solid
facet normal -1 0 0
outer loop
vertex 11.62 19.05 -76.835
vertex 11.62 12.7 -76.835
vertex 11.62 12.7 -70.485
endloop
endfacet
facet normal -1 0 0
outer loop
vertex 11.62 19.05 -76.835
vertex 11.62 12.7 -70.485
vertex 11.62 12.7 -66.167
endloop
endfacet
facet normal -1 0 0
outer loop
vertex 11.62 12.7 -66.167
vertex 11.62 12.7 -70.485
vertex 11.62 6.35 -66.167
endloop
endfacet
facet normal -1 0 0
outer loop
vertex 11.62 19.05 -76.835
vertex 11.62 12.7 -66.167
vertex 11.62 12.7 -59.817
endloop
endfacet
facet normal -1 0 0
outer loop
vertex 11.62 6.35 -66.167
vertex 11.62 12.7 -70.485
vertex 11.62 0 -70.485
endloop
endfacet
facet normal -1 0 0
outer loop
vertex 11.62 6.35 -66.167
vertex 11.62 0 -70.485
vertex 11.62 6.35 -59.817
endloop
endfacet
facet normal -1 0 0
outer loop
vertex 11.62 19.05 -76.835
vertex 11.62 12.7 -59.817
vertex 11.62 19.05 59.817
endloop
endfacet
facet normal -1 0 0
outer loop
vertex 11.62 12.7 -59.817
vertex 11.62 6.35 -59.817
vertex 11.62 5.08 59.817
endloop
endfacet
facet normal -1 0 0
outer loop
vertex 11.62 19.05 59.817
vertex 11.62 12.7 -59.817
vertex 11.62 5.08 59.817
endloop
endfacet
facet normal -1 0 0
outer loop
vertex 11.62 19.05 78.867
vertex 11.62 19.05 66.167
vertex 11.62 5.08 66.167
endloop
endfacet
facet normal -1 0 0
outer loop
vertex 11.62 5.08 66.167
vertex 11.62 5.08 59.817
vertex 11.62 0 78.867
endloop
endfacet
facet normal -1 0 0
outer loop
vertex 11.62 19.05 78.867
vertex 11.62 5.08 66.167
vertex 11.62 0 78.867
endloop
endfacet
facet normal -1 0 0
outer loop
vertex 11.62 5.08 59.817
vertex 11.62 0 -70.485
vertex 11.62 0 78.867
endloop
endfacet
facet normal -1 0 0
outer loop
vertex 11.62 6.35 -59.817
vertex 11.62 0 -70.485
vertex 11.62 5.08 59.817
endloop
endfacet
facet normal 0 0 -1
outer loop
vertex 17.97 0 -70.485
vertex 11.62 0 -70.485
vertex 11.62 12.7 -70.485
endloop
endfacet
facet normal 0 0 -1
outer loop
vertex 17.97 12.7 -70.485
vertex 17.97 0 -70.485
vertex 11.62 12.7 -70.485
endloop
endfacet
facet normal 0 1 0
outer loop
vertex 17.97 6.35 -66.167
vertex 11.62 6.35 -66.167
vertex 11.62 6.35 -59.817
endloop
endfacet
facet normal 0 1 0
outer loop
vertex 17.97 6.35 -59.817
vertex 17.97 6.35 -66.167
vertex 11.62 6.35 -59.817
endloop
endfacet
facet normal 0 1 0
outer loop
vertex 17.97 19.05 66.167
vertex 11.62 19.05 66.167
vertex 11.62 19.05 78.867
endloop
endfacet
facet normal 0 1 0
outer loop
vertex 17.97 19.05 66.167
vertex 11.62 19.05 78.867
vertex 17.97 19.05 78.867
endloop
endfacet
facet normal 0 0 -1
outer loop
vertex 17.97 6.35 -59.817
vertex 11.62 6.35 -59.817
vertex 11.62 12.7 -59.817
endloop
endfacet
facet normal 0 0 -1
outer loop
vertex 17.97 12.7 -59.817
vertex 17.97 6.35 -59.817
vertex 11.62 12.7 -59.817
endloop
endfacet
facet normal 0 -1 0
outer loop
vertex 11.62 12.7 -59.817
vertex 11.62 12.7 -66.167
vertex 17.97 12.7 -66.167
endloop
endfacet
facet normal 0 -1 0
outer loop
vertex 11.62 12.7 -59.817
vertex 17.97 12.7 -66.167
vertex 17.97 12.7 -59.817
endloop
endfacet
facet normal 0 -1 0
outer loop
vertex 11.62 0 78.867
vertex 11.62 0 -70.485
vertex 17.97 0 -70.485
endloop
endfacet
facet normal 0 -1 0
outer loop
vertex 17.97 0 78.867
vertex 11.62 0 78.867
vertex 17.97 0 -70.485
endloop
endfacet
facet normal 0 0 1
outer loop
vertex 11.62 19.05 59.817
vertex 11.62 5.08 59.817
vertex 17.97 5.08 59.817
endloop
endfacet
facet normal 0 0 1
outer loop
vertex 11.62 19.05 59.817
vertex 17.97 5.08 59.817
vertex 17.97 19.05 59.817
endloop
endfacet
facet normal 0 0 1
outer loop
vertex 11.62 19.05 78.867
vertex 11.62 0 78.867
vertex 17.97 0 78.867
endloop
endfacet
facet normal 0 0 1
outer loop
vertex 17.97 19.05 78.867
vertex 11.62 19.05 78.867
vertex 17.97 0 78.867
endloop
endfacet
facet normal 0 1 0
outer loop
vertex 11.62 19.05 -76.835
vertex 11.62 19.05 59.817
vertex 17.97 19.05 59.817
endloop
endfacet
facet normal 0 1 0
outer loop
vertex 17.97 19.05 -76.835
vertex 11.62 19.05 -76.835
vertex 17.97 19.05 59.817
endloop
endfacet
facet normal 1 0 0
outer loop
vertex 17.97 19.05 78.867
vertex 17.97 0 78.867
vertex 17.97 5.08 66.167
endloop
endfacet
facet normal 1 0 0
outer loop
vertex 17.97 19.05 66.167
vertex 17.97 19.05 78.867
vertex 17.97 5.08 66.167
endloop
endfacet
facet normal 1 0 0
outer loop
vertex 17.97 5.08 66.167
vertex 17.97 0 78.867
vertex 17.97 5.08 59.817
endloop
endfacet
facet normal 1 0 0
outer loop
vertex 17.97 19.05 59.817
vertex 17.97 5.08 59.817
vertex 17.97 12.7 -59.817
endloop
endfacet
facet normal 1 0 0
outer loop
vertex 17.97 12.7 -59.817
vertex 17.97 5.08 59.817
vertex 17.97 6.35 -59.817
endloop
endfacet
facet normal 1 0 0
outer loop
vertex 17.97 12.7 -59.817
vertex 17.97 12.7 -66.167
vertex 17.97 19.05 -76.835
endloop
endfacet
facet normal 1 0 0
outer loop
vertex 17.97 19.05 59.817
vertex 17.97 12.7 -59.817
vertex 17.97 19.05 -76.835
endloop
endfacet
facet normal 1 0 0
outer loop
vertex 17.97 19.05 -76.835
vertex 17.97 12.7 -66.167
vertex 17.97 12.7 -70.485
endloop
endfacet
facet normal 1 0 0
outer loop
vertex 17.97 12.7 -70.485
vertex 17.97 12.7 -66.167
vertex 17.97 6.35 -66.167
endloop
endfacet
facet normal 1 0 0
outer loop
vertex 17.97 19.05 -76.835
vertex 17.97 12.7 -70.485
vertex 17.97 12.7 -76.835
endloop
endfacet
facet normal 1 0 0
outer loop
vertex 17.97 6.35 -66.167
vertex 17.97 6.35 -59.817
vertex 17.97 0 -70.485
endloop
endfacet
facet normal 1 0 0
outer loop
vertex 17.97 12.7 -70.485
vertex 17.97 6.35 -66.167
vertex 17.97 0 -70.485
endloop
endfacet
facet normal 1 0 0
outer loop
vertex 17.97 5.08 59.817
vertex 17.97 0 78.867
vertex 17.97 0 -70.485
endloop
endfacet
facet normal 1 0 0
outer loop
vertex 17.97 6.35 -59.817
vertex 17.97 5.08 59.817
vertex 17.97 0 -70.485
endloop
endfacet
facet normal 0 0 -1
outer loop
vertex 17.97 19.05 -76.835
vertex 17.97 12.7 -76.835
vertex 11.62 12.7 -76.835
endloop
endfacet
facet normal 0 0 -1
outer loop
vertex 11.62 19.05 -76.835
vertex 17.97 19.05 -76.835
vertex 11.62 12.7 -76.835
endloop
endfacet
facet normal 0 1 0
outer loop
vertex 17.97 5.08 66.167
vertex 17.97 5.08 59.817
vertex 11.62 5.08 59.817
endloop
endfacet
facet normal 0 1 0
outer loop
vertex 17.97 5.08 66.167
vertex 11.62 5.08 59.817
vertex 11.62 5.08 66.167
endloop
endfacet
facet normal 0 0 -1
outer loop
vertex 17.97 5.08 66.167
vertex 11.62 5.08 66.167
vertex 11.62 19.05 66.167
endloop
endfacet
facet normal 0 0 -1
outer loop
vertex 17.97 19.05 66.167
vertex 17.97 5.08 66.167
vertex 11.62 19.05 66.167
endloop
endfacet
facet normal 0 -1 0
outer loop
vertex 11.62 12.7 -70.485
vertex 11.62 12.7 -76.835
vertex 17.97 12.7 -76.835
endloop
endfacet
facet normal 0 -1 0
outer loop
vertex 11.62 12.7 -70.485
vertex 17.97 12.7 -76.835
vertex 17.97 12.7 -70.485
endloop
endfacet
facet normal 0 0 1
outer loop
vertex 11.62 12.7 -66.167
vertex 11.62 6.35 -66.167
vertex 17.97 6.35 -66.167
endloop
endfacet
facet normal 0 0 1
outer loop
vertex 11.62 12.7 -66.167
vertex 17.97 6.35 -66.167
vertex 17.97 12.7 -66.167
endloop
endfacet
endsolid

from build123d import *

# Parameters (mm, degrees)
BOSS_EXTRUDE1_DEPTH = 19.05
SKETCH2_W           = 43.434
SKETCH2_H           = 13.97
MOTOR_HOLE_DEPTH    = 19.05
SKETCH3_W           = 6.35
SKETCH3_H           = 12.7
CUT_EXTRUDE2_DEPTH  = 36.941
SKETCH5_W           = 6.35
SKETCH5_H           = 13.97
SKETCH5_H_2         = 6.35
CUT_EXTRUDE6_DEPTH  = 36.941
SKETCH7_W           = 45.976326486
SKETCH7_H           = 159.787423729
CUT_EXTRUDE7_DEPTH  = 20.05


with BuildPart() as part:
    # Sketch1 → Boss-Extrude1 (new body)
    with BuildSketch(Plane(origin=(0, 0, 0), x_dir=(1, 0, 0), z_dir=(0, 1, 0))):
        Polygon((-10.033, 66.167), (-11.6205, 66.167), (-11.6205, 76.835), (-17.9705, 76.835), (-17.9705, -78.867), (-11.6205, -78.867), (-11.6205, -66.167), (11.6205, -66.167), (11.6205, -78.867), (17.9705, -78.867), (17.9705, 76.835), (11.6205, 76.835), (11.6205, 66.167), (10.033, 66.167), (10.033, 59.817), (11.6205, 59.817), (11.6205, -59.817), (-11.6205, -59.817), (-11.6205, 59.817), (-10.033, 59.817), align=None)
    extrude(amount=BOSS_EXTRUDE1_DEPTH)

    # Sketch2 → Motor Hole (cut)
    with BuildSketch(Plane.ZY.offset(17.9705)):
        with Locations((29.972, 12.065)):
            Rectangle(SKETCH2_W, SKETCH2_H)
    extrude(amount=-MOTOR_HOLE_DEPTH, mode=Mode.SUBTRACT)

    # Sketch3 → Cut-Extrude2 (cut, through all)
    with BuildSketch(Plane.ZY.offset(17.9705)):
        with Locations((-73.66, 6.35)):
            Rectangle(SKETCH3_W, SKETCH3_H)
    extrude(amount=-CUT_EXTRUDE2_DEPTH, mode=Mode.SUBTRACT)

    # Sketch5 → Cut-Extrude6 (cut, through all)
    with BuildSketch(Plane.ZY.offset(17.9705)):
        with Locations((62.992, 12.065)):
            Rectangle(SKETCH5_W, SKETCH5_H)
        with Locations((-62.992, 9.525)):
            Rectangle(SKETCH5_W, SKETCH5_H_2)
    extrude(amount=-CUT_EXTRUDE6_DEPTH, mode=Mode.SUBTRACT)

    # Sketch7 → Cut-Extrude7 (cut, through all)
    with BuildSketch(Plane(origin=(0, 0, 0), x_dir=(1, 0, 0), z_dir=(0, 1, 0))):
        with Locations((-11.367663243, 1.026711865)):
            Rectangle(SKETCH7_W, SKETCH7_H)
    extrude(amount=CUT_EXTRUDE7_DEPTH, mode=Mode.SUBTRACT)


solid = part.part
